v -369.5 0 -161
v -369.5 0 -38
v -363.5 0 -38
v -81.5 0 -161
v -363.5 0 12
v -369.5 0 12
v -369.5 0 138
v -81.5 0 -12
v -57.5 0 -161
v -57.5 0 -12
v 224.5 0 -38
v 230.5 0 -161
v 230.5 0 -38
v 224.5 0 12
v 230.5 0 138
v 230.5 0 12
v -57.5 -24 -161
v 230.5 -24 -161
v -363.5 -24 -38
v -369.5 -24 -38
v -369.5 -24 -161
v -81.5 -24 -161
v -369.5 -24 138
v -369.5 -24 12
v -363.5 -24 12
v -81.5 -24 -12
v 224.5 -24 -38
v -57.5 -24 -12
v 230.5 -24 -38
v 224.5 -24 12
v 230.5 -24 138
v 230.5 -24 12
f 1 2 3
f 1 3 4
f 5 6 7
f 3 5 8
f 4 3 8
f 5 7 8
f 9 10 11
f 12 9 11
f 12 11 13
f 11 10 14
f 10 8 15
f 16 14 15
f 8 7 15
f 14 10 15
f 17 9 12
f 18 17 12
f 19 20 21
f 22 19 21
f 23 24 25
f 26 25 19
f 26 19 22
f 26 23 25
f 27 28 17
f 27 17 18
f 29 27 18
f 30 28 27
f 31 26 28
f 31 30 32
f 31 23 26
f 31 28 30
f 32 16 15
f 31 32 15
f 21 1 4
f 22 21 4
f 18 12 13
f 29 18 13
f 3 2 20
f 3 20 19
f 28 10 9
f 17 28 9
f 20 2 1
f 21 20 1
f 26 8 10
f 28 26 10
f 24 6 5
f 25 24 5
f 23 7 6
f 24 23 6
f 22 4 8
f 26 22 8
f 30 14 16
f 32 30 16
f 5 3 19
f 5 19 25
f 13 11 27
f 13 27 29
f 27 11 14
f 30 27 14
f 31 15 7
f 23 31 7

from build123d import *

# Parameters (mm, degrees)
F0_W     = 6
F0_H     = 50
F1_DEPTH = 24
F2_DEPTH = 96


with BuildPart() as f1:
    # F0 (on Front) → F1 (new body)
    with BuildSketch(Plane.XZ):
        Polygon((230.500006, 138), (-369.499994, 138), (-369.499994, 12), (-363.499994, 12), (-363.499994, -38), (-369.499994, -38), (-369.499994, -161), (-81.499994, -161), (-81.499994, -12), (-57.499994, -12), (-57.499994, -161), (230.500006, -161), (230.500006, -38), (224.500006, -38), (224.500006, 12), (230.500006, 12), align=None)
        with Locations((-366.499994, -13)):
            Rectangle(F0_W, F0_H)
        with Locations((227.500006, -13)):
            Rectangle(F0_W, F0_H)
    extrude(amount=F1_DEPTH)

    # F0 (on Front) → F2 (cut)
    with BuildSketch(Plane.XZ):
        with Locations((-366.499994, -13)):
            Rectangle(F0_W, F0_H)
        with Locations((227.500006, -13)):
            Rectangle(F0_W, F0_H)
    extrude(amount=F2_DEPTH, mode=Mode.SUBTRACT)


solid = f1.part
